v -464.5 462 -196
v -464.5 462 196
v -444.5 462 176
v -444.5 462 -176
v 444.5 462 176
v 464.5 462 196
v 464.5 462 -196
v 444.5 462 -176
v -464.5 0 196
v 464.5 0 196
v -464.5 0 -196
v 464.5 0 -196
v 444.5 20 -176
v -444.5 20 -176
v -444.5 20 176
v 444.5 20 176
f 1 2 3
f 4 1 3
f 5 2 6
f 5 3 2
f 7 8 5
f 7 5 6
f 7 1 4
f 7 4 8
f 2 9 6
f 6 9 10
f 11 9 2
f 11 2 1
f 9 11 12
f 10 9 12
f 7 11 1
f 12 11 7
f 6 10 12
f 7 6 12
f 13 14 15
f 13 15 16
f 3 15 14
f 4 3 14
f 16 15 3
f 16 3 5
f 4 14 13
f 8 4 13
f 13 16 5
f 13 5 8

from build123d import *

# Parameters (mm, degrees)
SKETCH1_W          = 929
SKETCH1_H          = 392
BOTTOM_PLATE_DEPTH = 20
SKETCH2_W          = 929
SKETCH2_H          = 20
LEFT_WALL_DEPTH    = 462
SKETCH3_W          = 929
SKETCH3_H          = 20
RIGHT_WALL_DEPTH   = 462
SKETCH4_W          = 20
SKETCH4_H          = 352
BACK_WALL_DEPTH    = 462
SKETCH5_W          = 20
SKETCH5_H          = 352
FRONT_WALL_DEPTH   = 462


with BuildPart() as part:
    # Sketch1 → Bottom Plate (new body)
    with BuildSketch(Plane(origin=(0, 0, 0), x_dir=(1, 0, 0), z_dir=(0, 1, 0))):
        Rectangle(SKETCH1_W, SKETCH1_H)
    extrude(amount=BOTTOM_PLATE_DEPTH)

    # Sketch2 → Left Wall (add)
    with BuildSketch(Plane(origin=(0, 0, 0), x_dir=(1, 0, 0), z_dir=(0, 1, 0))):
        with Locations((0, 186)):
            Rectangle(SKETCH2_W, SKETCH2_H)
    extrude(amount=LEFT_WALL_DEPTH)

    # Sketch3 → Right Wall (add)
    with BuildSketch(Plane(origin=(0, 0, 0), x_dir=(1, 0, 0), z_dir=(0, 1, 0))):
        with Locations((0, -186)):
            Rectangle(SKETCH3_W, SKETCH3_H)
    extrude(amount=RIGHT_WALL_DEPTH)

    # Sketch4 → Back Wall (add)
    with BuildSketch(Plane(origin=(0, 0, 0), x_dir=(1, 0, 0), z_dir=(0, 1, 0))):
        with Locations((454.5, 0)):
            Rectangle(SKETCH4_W, SKETCH4_H)
    extrude(amount=BACK_WALL_DEPTH)

    # Sketch5 → Front Wall (add)
    with BuildSketch(Plane(origin=(0, 0, 0), x_dir=(1, 0, 0), z_dir=(0, 1, 0))):
        with Locations((-454.5, 0)):
            Rectangle(SKETCH5_W, SKETCH5_H)
    extrude(amount=FRONT_WALL_DEPTH)


solid = part.part
